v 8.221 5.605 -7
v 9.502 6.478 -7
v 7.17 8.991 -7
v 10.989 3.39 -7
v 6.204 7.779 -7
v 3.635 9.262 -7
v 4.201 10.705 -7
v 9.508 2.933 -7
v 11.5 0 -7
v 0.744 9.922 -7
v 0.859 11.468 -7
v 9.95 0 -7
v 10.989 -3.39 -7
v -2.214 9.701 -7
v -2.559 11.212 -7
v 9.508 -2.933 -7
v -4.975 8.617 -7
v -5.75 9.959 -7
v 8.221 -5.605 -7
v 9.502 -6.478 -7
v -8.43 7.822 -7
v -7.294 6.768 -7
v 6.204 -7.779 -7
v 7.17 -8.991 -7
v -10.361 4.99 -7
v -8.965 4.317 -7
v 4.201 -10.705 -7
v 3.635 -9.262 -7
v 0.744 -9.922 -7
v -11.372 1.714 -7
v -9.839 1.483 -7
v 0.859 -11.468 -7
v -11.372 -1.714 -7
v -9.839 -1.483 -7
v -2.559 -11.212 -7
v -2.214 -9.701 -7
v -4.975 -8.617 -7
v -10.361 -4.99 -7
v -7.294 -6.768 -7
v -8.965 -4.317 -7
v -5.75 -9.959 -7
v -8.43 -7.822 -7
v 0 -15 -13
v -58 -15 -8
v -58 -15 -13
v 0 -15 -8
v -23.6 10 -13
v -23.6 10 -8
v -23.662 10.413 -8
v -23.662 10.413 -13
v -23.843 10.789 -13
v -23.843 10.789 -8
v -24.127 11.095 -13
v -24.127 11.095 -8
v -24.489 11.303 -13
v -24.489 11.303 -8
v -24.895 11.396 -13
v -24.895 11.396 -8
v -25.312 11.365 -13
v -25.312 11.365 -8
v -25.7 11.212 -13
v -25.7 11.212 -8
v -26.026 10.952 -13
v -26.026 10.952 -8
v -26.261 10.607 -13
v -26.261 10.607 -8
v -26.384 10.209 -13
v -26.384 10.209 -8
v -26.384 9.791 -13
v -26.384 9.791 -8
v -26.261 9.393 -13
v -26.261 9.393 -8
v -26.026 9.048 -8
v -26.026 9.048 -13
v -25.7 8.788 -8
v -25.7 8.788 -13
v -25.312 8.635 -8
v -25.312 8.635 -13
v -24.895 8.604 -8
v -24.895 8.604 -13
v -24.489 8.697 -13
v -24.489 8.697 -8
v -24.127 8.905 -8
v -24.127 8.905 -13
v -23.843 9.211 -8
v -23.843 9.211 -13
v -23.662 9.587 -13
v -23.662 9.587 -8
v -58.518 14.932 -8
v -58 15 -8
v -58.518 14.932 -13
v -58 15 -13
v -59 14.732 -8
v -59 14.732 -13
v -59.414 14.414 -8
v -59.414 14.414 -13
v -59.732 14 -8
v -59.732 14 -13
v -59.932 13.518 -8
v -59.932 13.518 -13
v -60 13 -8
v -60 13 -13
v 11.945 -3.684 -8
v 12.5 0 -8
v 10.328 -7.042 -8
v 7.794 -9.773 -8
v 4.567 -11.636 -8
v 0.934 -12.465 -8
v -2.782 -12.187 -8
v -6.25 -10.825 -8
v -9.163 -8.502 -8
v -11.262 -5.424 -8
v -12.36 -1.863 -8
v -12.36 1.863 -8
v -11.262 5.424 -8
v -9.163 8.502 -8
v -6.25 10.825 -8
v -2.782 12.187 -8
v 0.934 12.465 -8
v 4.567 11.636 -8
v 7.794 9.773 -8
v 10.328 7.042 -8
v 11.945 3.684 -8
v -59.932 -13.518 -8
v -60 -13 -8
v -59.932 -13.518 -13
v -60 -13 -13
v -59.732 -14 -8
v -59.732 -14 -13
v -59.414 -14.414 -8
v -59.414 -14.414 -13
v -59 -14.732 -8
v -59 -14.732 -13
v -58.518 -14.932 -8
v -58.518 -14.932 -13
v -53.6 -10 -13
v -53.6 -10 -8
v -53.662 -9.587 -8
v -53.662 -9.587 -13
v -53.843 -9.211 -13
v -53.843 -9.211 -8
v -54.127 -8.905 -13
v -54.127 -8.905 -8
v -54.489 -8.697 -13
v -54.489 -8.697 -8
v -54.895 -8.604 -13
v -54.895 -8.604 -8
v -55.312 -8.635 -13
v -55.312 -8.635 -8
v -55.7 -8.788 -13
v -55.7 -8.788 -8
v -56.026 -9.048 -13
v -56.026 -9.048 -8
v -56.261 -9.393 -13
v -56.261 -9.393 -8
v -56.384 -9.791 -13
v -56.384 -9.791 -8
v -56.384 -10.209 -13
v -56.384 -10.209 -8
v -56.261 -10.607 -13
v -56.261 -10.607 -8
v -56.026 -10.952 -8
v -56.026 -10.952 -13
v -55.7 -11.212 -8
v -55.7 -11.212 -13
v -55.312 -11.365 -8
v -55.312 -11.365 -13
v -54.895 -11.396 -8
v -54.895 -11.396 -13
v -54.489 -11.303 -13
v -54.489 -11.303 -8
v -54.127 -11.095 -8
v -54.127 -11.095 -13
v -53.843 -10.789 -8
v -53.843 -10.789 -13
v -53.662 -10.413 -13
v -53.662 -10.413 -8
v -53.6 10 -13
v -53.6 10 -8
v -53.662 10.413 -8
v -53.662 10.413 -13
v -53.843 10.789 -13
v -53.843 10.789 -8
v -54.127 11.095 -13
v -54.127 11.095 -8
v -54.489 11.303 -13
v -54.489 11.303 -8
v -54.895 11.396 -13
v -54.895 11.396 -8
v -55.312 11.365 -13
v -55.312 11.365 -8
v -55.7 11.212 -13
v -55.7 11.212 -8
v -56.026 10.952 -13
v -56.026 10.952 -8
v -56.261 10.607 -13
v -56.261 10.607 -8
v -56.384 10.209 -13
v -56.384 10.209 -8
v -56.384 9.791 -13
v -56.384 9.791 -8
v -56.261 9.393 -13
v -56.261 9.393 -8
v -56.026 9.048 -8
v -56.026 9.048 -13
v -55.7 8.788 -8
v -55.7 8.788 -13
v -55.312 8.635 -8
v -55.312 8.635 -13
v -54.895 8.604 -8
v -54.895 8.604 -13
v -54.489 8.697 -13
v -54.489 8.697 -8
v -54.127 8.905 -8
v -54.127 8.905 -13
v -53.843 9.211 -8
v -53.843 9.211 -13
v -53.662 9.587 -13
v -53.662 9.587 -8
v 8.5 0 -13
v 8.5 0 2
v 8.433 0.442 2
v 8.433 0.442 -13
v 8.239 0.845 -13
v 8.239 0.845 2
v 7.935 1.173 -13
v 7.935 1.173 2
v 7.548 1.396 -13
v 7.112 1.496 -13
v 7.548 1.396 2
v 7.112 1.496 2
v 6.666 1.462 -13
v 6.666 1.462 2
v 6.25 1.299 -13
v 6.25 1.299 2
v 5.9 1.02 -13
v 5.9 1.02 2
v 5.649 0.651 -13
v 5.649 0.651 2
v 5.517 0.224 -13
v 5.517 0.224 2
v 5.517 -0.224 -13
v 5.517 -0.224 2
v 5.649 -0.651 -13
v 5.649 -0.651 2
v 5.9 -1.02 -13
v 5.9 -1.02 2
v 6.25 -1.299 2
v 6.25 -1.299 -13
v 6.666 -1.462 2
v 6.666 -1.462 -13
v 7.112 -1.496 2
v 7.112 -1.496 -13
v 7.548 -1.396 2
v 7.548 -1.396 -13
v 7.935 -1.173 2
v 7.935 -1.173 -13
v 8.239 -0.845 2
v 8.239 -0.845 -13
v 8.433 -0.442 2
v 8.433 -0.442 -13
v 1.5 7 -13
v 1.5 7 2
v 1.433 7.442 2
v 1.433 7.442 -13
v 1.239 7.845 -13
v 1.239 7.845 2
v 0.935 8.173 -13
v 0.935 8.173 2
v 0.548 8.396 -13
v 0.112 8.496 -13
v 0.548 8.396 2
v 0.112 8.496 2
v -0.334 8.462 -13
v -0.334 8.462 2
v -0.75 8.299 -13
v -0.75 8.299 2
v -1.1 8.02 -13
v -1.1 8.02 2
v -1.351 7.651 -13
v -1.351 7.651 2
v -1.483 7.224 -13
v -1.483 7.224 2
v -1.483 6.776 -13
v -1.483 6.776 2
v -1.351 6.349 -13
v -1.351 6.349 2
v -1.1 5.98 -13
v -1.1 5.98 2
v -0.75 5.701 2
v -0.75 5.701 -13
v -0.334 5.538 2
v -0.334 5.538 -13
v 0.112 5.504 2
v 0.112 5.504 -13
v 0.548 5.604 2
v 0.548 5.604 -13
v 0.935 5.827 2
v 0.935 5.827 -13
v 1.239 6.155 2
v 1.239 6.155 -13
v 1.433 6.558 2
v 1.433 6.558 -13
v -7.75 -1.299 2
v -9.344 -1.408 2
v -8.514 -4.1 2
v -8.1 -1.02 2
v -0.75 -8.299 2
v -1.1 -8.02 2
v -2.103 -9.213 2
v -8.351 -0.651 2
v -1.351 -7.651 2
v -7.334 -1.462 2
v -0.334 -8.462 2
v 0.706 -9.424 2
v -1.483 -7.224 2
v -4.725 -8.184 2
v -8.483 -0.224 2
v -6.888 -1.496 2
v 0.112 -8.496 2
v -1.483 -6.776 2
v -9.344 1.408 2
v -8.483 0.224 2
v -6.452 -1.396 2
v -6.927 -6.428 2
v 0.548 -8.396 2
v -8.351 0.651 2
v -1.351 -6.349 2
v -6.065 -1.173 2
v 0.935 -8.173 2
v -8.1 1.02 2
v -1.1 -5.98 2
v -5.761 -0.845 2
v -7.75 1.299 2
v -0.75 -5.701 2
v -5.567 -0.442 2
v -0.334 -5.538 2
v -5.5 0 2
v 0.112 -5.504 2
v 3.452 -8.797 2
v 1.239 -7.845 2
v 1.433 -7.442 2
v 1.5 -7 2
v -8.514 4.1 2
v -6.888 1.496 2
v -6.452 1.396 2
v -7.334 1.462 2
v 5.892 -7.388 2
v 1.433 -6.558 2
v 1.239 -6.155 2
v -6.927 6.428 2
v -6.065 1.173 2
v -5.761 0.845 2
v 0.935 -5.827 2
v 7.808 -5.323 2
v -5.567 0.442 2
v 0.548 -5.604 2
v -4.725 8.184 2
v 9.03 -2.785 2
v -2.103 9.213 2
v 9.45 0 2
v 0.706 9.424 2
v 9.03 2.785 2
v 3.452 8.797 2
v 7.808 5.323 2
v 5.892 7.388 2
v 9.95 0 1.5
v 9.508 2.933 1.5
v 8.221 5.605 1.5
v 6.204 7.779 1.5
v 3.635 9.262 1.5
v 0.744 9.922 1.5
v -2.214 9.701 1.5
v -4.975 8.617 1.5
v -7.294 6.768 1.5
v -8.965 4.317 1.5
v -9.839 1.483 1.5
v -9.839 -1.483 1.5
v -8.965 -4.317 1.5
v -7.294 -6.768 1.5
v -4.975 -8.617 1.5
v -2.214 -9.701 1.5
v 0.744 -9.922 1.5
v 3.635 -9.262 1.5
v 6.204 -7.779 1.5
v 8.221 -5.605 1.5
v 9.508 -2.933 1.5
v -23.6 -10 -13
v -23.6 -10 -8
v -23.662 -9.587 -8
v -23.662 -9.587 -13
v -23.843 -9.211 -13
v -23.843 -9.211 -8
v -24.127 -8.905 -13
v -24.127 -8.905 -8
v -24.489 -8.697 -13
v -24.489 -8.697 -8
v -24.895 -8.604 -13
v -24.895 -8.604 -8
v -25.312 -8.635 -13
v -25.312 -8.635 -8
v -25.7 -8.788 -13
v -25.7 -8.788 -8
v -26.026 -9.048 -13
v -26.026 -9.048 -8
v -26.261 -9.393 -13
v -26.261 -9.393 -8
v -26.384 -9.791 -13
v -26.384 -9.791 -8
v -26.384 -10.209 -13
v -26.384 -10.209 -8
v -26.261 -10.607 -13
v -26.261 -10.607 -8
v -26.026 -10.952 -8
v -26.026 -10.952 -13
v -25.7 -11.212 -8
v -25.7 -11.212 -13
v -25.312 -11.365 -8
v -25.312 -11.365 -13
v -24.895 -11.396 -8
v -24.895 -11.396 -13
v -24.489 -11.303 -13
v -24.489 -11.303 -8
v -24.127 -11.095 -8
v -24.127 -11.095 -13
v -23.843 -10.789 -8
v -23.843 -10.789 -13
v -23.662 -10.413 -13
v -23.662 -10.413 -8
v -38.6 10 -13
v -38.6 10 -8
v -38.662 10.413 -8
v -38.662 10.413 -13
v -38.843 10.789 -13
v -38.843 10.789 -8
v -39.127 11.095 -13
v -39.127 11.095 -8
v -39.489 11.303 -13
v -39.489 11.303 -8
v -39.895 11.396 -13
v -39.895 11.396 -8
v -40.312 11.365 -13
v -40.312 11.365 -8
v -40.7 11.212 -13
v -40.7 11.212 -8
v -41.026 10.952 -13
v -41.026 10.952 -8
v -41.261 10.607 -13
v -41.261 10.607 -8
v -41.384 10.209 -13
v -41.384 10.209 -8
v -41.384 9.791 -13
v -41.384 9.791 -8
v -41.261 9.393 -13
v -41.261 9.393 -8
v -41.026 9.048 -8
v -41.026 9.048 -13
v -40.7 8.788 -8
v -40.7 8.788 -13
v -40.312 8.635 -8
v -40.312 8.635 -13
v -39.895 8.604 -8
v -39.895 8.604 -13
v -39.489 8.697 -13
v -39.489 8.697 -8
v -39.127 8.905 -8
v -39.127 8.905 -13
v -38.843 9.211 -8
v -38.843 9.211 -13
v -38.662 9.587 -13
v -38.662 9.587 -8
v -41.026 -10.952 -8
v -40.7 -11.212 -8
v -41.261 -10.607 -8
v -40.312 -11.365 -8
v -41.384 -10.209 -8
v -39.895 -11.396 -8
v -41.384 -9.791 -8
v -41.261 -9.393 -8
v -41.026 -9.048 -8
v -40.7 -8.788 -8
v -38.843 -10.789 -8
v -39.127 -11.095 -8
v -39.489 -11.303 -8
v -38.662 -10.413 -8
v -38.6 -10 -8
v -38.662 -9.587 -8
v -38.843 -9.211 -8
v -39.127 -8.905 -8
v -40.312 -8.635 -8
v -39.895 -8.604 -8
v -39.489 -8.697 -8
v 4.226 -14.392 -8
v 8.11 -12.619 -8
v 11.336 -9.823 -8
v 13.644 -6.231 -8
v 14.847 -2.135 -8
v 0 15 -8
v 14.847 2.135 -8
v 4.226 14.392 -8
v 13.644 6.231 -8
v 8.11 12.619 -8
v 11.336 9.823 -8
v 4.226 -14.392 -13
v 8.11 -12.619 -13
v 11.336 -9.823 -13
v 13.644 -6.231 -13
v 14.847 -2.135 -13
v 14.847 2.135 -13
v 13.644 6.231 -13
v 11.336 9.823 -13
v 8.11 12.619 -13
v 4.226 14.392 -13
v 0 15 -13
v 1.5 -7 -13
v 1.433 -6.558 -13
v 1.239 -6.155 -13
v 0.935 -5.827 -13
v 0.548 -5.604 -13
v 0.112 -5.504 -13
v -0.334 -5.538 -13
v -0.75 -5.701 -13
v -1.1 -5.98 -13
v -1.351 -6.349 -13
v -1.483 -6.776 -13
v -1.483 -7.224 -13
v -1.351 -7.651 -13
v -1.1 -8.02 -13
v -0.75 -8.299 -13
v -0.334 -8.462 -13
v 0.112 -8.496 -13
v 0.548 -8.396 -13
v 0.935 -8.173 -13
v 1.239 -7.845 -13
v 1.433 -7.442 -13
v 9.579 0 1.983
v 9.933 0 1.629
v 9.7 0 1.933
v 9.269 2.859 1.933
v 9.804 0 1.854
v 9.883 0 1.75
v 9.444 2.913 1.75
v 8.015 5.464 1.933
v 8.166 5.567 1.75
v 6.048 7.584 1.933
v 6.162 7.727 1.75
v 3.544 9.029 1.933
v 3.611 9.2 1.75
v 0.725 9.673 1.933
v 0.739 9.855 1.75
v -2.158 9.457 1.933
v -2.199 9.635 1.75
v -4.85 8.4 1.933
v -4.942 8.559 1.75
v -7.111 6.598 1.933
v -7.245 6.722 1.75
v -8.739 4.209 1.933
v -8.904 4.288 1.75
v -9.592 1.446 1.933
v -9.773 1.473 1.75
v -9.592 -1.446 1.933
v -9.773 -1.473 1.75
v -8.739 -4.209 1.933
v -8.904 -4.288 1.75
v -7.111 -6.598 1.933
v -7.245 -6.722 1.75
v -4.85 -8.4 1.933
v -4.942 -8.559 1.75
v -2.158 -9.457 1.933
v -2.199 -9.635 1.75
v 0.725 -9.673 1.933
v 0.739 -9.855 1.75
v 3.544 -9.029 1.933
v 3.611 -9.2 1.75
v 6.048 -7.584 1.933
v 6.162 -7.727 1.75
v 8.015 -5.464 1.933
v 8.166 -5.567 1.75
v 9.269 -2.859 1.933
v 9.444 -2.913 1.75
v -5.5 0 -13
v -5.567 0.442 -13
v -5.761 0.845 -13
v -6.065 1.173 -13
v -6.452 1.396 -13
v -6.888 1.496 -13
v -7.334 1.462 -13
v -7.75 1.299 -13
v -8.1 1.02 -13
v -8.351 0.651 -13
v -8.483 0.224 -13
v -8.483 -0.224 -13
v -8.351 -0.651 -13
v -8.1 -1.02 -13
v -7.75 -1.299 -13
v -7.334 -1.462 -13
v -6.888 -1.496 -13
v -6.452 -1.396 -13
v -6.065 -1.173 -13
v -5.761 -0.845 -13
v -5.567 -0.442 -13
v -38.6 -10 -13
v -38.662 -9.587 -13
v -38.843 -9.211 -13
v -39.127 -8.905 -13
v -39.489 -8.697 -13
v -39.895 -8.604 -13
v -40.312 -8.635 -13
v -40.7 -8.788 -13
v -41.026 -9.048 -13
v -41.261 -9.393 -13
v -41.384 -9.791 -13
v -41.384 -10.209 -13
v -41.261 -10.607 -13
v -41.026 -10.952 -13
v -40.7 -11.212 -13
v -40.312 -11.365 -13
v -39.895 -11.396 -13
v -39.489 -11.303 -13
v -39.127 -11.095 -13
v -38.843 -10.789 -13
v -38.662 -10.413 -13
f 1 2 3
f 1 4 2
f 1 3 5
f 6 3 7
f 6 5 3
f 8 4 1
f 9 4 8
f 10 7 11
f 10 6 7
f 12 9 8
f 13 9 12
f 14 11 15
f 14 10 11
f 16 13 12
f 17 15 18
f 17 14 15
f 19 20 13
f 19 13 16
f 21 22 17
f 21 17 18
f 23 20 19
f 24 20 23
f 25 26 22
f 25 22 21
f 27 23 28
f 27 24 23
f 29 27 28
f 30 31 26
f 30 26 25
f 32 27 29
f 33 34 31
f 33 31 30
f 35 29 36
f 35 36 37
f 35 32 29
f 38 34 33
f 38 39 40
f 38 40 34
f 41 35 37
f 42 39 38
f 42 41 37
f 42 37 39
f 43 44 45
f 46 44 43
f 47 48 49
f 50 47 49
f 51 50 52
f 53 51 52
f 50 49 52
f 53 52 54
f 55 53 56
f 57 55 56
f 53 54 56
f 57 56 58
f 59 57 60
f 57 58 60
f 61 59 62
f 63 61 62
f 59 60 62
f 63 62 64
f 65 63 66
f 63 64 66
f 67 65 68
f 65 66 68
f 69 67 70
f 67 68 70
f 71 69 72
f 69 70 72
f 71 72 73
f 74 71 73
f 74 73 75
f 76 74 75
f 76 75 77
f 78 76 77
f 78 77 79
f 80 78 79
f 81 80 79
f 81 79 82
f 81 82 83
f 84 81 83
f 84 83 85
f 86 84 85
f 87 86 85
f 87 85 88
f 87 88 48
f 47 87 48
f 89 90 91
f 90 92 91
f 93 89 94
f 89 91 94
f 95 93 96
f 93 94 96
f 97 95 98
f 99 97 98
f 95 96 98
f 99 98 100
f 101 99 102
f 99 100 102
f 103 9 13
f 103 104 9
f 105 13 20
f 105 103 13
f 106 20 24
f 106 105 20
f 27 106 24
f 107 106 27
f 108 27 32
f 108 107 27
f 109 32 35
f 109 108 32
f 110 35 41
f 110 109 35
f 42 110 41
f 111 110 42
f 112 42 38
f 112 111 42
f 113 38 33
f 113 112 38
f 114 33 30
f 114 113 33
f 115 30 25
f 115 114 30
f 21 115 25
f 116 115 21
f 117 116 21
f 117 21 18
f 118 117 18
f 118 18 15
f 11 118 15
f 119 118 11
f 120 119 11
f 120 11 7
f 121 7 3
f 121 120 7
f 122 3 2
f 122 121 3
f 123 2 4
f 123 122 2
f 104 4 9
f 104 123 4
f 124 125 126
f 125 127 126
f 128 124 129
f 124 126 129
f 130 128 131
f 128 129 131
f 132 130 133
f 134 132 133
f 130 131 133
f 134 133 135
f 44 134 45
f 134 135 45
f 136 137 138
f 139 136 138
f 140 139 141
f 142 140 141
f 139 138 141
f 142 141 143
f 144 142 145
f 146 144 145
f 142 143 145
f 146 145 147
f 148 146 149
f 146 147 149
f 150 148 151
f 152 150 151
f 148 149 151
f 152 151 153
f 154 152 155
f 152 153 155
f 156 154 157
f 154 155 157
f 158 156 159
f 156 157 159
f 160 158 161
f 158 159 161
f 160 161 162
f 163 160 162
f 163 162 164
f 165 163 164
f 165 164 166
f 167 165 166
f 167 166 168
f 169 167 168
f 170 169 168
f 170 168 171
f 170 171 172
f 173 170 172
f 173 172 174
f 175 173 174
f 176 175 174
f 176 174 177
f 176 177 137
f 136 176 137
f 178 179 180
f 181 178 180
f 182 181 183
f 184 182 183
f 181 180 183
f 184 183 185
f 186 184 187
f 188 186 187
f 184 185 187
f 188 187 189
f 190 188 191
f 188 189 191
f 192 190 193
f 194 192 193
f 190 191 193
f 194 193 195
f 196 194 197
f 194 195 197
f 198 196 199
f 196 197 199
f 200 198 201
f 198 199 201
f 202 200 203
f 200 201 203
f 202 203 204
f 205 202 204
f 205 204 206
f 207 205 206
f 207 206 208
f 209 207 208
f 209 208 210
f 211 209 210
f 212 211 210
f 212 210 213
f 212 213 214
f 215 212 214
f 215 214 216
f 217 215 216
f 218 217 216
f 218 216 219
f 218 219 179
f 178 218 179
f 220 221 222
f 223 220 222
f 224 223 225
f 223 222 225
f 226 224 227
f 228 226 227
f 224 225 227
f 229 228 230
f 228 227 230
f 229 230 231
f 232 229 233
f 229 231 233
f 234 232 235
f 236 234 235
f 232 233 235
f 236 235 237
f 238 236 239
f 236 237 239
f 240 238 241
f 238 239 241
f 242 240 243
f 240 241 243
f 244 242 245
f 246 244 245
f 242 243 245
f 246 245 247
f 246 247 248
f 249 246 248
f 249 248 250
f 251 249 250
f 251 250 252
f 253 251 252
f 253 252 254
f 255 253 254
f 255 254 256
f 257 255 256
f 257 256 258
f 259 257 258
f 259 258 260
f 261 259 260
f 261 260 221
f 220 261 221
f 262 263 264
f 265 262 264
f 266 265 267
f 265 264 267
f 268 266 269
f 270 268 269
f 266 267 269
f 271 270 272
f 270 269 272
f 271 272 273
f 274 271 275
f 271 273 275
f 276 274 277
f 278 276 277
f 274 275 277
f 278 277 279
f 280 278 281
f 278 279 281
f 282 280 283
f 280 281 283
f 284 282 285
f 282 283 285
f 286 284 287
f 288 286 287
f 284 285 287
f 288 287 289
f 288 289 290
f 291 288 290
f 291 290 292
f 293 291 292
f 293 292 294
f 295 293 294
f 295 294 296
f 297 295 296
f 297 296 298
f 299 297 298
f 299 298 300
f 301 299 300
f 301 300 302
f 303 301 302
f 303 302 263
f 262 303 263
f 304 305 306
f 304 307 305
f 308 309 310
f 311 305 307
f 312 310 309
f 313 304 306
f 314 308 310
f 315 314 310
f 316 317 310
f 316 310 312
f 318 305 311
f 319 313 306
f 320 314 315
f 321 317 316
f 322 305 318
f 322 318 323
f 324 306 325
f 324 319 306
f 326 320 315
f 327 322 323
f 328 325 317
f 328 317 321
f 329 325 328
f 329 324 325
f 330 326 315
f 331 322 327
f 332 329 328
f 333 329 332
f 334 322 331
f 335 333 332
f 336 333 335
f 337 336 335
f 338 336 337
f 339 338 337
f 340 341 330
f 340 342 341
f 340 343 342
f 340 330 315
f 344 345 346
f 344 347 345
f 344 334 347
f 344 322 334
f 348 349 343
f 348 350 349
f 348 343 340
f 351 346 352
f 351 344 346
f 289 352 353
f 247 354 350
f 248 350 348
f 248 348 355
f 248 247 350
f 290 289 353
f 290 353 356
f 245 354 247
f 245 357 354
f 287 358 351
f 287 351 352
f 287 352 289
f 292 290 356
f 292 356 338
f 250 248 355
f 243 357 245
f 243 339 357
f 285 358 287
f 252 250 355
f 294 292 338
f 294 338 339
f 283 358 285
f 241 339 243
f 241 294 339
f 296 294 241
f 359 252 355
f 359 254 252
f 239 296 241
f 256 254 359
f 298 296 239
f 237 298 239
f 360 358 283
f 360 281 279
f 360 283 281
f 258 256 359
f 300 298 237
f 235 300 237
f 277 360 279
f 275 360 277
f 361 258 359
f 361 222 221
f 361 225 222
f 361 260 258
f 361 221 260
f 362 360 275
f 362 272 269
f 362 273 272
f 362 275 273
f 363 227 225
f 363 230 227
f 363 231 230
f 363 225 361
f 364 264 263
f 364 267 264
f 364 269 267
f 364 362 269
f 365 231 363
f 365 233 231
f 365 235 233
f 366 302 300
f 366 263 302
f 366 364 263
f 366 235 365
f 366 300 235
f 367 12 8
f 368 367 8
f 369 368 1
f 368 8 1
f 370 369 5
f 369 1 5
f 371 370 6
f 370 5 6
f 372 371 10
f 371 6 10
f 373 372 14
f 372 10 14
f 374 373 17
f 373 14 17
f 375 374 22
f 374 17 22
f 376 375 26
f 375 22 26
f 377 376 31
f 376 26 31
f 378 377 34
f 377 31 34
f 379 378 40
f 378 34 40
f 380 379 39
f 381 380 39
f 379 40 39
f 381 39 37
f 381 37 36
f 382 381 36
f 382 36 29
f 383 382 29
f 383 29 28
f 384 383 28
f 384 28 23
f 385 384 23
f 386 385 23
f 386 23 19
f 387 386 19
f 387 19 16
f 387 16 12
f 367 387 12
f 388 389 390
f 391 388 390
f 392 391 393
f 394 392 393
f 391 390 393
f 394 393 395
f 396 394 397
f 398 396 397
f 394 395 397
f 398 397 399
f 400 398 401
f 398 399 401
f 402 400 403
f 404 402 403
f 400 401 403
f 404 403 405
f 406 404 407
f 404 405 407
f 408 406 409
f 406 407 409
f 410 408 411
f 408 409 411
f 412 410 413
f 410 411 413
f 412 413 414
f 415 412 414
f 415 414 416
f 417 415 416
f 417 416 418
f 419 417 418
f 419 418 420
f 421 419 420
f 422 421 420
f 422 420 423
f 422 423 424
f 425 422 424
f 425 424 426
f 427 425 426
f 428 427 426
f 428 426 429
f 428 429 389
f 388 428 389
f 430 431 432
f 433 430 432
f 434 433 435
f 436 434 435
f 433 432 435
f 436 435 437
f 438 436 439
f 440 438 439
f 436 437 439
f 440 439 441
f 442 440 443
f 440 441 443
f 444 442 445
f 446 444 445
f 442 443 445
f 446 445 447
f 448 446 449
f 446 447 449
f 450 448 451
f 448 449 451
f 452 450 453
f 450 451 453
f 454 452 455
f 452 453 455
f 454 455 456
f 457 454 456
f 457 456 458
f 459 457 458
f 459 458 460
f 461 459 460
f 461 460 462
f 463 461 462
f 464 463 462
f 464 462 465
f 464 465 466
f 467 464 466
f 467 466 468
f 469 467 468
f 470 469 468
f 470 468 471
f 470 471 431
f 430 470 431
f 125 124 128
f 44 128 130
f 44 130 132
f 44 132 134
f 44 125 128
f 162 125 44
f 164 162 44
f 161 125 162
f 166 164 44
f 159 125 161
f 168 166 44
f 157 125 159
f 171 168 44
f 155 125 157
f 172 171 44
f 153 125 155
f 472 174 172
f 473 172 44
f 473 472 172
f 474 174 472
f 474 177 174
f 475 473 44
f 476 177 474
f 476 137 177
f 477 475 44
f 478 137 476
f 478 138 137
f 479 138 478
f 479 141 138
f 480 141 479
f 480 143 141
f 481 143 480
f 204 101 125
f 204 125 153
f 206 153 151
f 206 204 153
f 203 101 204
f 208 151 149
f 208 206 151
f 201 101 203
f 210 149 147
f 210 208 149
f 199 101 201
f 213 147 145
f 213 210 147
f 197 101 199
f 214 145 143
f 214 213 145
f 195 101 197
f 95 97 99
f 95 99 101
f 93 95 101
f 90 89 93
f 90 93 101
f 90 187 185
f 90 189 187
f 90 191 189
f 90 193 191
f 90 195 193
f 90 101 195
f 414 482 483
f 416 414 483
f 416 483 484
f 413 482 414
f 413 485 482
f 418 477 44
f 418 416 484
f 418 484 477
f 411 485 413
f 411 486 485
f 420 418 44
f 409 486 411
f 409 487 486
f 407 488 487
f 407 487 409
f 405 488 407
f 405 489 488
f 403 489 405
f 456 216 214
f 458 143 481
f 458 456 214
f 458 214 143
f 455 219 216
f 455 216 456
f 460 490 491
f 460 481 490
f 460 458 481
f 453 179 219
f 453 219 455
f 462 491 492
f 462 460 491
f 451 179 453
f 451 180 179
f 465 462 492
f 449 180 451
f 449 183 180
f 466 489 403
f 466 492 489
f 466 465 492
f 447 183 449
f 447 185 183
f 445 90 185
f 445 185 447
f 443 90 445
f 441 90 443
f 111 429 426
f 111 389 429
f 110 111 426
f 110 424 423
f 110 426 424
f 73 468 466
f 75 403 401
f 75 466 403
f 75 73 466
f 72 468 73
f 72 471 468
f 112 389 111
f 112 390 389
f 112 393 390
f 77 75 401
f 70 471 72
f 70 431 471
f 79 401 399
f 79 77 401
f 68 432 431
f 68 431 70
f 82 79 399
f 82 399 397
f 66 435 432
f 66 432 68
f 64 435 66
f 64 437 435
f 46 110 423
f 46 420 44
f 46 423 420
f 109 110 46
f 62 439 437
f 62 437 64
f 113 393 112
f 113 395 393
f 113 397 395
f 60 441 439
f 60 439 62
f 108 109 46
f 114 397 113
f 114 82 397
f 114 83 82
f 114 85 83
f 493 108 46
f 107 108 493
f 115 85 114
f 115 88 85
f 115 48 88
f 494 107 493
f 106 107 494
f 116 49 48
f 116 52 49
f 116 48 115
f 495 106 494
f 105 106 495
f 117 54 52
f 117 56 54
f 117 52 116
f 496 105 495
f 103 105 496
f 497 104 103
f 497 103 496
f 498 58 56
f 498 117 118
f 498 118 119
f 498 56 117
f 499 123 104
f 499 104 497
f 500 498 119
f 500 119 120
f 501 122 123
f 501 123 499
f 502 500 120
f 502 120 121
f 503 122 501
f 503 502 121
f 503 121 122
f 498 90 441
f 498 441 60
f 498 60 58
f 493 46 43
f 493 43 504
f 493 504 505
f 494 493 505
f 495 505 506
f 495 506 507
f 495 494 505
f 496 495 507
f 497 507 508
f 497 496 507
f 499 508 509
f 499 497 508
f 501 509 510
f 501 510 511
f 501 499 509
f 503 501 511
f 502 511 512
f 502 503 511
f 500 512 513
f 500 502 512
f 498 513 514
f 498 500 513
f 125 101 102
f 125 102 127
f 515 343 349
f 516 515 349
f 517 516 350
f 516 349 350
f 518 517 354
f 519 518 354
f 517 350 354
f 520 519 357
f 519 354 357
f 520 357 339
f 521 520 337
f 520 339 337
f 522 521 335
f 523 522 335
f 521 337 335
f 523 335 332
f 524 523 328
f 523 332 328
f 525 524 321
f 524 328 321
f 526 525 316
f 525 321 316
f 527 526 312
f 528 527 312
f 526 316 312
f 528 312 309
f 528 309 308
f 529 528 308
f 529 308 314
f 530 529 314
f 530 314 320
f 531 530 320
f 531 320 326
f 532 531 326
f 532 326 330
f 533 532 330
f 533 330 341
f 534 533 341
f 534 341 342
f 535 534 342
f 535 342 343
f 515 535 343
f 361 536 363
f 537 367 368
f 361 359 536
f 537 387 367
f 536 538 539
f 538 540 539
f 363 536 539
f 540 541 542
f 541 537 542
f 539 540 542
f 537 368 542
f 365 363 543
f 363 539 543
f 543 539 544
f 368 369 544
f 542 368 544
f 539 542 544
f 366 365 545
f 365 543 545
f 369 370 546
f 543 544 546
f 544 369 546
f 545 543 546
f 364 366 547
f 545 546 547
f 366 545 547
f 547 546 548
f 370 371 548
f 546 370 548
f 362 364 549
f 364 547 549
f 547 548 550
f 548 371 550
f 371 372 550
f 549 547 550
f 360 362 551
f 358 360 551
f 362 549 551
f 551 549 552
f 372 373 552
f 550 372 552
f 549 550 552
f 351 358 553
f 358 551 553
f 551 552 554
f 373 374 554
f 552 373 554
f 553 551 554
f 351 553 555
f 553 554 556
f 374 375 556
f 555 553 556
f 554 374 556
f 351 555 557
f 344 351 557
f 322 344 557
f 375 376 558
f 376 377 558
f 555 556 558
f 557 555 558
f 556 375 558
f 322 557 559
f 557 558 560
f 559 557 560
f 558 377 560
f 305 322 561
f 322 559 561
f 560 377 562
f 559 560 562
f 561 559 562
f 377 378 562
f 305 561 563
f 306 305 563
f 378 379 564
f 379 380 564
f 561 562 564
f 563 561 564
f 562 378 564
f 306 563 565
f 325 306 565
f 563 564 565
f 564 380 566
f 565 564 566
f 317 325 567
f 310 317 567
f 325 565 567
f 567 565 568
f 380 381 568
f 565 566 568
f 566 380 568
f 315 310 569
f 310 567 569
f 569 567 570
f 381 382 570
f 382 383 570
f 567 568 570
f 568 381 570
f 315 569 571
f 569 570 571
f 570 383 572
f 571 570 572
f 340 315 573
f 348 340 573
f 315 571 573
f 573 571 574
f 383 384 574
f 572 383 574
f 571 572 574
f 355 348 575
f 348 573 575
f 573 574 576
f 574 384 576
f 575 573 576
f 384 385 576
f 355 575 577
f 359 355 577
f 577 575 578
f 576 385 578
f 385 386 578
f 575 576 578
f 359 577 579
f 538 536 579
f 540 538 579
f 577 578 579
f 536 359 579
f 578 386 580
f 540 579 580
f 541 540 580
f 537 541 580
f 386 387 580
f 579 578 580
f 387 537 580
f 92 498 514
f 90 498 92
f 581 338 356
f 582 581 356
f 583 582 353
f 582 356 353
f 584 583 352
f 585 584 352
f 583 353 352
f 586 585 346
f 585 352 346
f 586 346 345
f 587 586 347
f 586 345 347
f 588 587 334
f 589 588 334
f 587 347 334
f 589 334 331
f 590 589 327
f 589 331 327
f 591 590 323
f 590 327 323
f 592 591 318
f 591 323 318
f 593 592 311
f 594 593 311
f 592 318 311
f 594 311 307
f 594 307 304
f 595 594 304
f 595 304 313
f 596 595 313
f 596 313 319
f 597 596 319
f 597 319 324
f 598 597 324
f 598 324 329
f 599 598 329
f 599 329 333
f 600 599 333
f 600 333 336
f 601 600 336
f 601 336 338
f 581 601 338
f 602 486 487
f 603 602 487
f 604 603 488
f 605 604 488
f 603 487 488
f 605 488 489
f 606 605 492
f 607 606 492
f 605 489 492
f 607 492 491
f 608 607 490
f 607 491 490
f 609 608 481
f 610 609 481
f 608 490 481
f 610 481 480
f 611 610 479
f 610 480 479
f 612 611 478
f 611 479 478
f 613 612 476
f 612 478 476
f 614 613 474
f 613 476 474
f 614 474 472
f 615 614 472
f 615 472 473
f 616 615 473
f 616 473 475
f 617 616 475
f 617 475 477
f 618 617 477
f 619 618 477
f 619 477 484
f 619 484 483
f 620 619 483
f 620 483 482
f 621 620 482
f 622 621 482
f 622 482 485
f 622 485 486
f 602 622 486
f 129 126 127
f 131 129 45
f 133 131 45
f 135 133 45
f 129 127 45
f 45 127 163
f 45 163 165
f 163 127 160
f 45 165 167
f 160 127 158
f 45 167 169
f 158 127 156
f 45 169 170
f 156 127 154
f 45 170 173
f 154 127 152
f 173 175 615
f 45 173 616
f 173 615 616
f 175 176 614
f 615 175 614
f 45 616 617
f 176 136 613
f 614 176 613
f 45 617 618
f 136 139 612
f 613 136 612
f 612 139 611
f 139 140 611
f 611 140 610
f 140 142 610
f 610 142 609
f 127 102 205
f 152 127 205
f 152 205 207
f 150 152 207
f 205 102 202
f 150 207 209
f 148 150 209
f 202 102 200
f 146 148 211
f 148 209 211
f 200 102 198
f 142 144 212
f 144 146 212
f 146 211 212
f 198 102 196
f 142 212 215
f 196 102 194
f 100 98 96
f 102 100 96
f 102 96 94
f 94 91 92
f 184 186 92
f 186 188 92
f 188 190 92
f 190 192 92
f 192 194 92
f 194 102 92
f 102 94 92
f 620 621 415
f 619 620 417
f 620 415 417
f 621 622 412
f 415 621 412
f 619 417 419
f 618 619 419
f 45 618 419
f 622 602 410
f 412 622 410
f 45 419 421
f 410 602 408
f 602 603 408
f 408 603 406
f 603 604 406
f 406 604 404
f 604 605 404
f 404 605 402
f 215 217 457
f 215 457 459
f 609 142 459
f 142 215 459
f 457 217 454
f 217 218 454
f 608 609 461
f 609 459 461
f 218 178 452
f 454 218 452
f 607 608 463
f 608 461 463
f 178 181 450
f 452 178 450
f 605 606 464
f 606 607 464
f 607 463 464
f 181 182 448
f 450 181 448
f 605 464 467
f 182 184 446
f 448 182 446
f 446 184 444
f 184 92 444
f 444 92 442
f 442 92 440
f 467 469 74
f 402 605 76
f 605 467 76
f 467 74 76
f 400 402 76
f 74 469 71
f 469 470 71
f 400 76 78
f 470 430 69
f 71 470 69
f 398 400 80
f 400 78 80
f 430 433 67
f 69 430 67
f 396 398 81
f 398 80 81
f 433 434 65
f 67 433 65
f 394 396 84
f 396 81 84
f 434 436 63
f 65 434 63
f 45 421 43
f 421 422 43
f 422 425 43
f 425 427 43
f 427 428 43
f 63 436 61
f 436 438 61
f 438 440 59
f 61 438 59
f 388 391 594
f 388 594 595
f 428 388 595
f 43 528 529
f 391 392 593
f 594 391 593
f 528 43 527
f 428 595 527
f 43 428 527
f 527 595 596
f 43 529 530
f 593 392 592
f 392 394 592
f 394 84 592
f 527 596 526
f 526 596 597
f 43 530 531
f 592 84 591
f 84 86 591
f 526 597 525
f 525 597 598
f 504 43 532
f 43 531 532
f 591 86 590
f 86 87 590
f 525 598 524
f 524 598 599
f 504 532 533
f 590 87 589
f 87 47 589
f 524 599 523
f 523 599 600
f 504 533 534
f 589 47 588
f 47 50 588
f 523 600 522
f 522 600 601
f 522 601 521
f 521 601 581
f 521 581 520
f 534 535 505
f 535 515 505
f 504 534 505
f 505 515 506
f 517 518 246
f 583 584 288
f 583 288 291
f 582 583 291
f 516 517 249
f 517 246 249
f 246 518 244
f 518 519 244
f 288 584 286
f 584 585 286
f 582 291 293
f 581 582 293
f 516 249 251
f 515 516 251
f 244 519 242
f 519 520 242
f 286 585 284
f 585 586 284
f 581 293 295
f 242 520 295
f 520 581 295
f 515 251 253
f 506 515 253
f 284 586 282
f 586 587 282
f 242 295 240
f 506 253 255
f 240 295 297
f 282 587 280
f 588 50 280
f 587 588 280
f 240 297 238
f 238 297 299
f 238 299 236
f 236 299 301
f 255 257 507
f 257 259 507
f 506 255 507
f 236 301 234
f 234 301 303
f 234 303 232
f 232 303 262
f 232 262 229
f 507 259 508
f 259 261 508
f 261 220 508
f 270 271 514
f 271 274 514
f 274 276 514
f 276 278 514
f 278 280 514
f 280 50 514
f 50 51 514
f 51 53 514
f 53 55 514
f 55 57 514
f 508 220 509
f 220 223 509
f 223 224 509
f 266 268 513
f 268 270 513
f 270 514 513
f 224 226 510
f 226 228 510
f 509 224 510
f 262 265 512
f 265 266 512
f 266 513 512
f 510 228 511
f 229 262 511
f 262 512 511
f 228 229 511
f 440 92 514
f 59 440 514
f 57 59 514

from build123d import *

# Parameters (mm, degrees)
BOSS_EXTRUDE1_DEPTH = 5
SKETCH3_R           = 9.95
BOSS_EXTRUDE2_DEPTH = 2
SKETCH4_R           = 1.5
CUT_EXTRUDE1_DEPTH  = 64.639610307
SKETCH5_R           = 1.4
CUT_EXTRUDE2_DEPTH  = 63.649820431
FILLET1_R           = 2
FILLET2_R           = 0.5


with BuildPart() as part:
    # Sketch1 → Revolve1 (revolve)
    with BuildSketch(Plane(origin=(0, 0, 0), x_dir=(1, 0, 0), z_dir=(0, 1, 0))):
        Polygon((0, 0), (9.95, 0), (9.95, 7), (11.5, 7), (12.5, 8), (0, 8), align=None)
    revolve(axis=Axis((0, 0, 0), (0, 0, -1)))

    # Sketch2 → Boss-Extrude1 (add)
    with BuildSketch(Plane(origin=(0, 0, -8), x_dir=(-1, 0, 0), z_dir=(0, 0, -1))):
        with BuildLine():
            Line((0, 15), (60, 15))
            Line((60, 15), (60, -15))
            Line((60, -15), (0, -15))
            ThreePointArc((0, -15), (-15, 0), (0, 15))
        make_face()
    extrude(amount=BOSS_EXTRUDE1_DEPTH)

    # Sketch3 → Boss-Extrude2 (add)
    with BuildSketch(Plane.XY):
        Circle(SKETCH3_R)
    extrude(amount=BOSS_EXTRUDE2_DEPTH)

    # Sketch4 → Cut-Extrude1 (cut, through all)
    with BuildSketch(Plane.XY.offset(2)):
        with Locations((0, 7)):
            Circle(SKETCH4_R)
        with Locations((7, 0)):
            Circle(SKETCH4_R)
        with Locations((0, -7)):
            Circle(SKETCH4_R)
        with Locations((-7, 0)):
            Circle(SKETCH4_R)
    extrude(amount=-CUT_EXTRUDE1_DEPTH, mode=Mode.SUBTRACT)

    # Sketch5 → Cut-Extrude2 (cut, through all)
    with BuildSketch(Plane.XY.offset(-8)):
        with Locations((-55, 10)):
            Circle(SKETCH5_R)
        with Locations((-55, -10)):
            Circle(SKETCH5_R)
        with Locations((-40, 10)):
            Circle(SKETCH5_R)
        with Locations((-40, -10)):
            Circle(SKETCH5_R)
        with Locations((-25, 10)):
            Circle(SKETCH5_R)
        with Locations((-25, -10)):
            Circle(SKETCH5_R)
    extrude(amount=-CUT_EXTRUDE2_DEPTH, mode=Mode.SUBTRACT)

    # Fillet1
    fillet1_edges = [part.edges().sort_by_distance(p)[0] for p in [
        (-60, -15, -10.5),
        (-60, 15, -10.5),
    ]]
    fillet(fillet1_edges, radius=FILLET1_R)

    # Fillet2
    fillet2_edges = [part.edges().sort_by_distance(p)[0] for p in [
        (-9.95, 0, 2),
    ]]
    fillet(fillet2_edges, radius=FILLET2_R)


solid = part.part
